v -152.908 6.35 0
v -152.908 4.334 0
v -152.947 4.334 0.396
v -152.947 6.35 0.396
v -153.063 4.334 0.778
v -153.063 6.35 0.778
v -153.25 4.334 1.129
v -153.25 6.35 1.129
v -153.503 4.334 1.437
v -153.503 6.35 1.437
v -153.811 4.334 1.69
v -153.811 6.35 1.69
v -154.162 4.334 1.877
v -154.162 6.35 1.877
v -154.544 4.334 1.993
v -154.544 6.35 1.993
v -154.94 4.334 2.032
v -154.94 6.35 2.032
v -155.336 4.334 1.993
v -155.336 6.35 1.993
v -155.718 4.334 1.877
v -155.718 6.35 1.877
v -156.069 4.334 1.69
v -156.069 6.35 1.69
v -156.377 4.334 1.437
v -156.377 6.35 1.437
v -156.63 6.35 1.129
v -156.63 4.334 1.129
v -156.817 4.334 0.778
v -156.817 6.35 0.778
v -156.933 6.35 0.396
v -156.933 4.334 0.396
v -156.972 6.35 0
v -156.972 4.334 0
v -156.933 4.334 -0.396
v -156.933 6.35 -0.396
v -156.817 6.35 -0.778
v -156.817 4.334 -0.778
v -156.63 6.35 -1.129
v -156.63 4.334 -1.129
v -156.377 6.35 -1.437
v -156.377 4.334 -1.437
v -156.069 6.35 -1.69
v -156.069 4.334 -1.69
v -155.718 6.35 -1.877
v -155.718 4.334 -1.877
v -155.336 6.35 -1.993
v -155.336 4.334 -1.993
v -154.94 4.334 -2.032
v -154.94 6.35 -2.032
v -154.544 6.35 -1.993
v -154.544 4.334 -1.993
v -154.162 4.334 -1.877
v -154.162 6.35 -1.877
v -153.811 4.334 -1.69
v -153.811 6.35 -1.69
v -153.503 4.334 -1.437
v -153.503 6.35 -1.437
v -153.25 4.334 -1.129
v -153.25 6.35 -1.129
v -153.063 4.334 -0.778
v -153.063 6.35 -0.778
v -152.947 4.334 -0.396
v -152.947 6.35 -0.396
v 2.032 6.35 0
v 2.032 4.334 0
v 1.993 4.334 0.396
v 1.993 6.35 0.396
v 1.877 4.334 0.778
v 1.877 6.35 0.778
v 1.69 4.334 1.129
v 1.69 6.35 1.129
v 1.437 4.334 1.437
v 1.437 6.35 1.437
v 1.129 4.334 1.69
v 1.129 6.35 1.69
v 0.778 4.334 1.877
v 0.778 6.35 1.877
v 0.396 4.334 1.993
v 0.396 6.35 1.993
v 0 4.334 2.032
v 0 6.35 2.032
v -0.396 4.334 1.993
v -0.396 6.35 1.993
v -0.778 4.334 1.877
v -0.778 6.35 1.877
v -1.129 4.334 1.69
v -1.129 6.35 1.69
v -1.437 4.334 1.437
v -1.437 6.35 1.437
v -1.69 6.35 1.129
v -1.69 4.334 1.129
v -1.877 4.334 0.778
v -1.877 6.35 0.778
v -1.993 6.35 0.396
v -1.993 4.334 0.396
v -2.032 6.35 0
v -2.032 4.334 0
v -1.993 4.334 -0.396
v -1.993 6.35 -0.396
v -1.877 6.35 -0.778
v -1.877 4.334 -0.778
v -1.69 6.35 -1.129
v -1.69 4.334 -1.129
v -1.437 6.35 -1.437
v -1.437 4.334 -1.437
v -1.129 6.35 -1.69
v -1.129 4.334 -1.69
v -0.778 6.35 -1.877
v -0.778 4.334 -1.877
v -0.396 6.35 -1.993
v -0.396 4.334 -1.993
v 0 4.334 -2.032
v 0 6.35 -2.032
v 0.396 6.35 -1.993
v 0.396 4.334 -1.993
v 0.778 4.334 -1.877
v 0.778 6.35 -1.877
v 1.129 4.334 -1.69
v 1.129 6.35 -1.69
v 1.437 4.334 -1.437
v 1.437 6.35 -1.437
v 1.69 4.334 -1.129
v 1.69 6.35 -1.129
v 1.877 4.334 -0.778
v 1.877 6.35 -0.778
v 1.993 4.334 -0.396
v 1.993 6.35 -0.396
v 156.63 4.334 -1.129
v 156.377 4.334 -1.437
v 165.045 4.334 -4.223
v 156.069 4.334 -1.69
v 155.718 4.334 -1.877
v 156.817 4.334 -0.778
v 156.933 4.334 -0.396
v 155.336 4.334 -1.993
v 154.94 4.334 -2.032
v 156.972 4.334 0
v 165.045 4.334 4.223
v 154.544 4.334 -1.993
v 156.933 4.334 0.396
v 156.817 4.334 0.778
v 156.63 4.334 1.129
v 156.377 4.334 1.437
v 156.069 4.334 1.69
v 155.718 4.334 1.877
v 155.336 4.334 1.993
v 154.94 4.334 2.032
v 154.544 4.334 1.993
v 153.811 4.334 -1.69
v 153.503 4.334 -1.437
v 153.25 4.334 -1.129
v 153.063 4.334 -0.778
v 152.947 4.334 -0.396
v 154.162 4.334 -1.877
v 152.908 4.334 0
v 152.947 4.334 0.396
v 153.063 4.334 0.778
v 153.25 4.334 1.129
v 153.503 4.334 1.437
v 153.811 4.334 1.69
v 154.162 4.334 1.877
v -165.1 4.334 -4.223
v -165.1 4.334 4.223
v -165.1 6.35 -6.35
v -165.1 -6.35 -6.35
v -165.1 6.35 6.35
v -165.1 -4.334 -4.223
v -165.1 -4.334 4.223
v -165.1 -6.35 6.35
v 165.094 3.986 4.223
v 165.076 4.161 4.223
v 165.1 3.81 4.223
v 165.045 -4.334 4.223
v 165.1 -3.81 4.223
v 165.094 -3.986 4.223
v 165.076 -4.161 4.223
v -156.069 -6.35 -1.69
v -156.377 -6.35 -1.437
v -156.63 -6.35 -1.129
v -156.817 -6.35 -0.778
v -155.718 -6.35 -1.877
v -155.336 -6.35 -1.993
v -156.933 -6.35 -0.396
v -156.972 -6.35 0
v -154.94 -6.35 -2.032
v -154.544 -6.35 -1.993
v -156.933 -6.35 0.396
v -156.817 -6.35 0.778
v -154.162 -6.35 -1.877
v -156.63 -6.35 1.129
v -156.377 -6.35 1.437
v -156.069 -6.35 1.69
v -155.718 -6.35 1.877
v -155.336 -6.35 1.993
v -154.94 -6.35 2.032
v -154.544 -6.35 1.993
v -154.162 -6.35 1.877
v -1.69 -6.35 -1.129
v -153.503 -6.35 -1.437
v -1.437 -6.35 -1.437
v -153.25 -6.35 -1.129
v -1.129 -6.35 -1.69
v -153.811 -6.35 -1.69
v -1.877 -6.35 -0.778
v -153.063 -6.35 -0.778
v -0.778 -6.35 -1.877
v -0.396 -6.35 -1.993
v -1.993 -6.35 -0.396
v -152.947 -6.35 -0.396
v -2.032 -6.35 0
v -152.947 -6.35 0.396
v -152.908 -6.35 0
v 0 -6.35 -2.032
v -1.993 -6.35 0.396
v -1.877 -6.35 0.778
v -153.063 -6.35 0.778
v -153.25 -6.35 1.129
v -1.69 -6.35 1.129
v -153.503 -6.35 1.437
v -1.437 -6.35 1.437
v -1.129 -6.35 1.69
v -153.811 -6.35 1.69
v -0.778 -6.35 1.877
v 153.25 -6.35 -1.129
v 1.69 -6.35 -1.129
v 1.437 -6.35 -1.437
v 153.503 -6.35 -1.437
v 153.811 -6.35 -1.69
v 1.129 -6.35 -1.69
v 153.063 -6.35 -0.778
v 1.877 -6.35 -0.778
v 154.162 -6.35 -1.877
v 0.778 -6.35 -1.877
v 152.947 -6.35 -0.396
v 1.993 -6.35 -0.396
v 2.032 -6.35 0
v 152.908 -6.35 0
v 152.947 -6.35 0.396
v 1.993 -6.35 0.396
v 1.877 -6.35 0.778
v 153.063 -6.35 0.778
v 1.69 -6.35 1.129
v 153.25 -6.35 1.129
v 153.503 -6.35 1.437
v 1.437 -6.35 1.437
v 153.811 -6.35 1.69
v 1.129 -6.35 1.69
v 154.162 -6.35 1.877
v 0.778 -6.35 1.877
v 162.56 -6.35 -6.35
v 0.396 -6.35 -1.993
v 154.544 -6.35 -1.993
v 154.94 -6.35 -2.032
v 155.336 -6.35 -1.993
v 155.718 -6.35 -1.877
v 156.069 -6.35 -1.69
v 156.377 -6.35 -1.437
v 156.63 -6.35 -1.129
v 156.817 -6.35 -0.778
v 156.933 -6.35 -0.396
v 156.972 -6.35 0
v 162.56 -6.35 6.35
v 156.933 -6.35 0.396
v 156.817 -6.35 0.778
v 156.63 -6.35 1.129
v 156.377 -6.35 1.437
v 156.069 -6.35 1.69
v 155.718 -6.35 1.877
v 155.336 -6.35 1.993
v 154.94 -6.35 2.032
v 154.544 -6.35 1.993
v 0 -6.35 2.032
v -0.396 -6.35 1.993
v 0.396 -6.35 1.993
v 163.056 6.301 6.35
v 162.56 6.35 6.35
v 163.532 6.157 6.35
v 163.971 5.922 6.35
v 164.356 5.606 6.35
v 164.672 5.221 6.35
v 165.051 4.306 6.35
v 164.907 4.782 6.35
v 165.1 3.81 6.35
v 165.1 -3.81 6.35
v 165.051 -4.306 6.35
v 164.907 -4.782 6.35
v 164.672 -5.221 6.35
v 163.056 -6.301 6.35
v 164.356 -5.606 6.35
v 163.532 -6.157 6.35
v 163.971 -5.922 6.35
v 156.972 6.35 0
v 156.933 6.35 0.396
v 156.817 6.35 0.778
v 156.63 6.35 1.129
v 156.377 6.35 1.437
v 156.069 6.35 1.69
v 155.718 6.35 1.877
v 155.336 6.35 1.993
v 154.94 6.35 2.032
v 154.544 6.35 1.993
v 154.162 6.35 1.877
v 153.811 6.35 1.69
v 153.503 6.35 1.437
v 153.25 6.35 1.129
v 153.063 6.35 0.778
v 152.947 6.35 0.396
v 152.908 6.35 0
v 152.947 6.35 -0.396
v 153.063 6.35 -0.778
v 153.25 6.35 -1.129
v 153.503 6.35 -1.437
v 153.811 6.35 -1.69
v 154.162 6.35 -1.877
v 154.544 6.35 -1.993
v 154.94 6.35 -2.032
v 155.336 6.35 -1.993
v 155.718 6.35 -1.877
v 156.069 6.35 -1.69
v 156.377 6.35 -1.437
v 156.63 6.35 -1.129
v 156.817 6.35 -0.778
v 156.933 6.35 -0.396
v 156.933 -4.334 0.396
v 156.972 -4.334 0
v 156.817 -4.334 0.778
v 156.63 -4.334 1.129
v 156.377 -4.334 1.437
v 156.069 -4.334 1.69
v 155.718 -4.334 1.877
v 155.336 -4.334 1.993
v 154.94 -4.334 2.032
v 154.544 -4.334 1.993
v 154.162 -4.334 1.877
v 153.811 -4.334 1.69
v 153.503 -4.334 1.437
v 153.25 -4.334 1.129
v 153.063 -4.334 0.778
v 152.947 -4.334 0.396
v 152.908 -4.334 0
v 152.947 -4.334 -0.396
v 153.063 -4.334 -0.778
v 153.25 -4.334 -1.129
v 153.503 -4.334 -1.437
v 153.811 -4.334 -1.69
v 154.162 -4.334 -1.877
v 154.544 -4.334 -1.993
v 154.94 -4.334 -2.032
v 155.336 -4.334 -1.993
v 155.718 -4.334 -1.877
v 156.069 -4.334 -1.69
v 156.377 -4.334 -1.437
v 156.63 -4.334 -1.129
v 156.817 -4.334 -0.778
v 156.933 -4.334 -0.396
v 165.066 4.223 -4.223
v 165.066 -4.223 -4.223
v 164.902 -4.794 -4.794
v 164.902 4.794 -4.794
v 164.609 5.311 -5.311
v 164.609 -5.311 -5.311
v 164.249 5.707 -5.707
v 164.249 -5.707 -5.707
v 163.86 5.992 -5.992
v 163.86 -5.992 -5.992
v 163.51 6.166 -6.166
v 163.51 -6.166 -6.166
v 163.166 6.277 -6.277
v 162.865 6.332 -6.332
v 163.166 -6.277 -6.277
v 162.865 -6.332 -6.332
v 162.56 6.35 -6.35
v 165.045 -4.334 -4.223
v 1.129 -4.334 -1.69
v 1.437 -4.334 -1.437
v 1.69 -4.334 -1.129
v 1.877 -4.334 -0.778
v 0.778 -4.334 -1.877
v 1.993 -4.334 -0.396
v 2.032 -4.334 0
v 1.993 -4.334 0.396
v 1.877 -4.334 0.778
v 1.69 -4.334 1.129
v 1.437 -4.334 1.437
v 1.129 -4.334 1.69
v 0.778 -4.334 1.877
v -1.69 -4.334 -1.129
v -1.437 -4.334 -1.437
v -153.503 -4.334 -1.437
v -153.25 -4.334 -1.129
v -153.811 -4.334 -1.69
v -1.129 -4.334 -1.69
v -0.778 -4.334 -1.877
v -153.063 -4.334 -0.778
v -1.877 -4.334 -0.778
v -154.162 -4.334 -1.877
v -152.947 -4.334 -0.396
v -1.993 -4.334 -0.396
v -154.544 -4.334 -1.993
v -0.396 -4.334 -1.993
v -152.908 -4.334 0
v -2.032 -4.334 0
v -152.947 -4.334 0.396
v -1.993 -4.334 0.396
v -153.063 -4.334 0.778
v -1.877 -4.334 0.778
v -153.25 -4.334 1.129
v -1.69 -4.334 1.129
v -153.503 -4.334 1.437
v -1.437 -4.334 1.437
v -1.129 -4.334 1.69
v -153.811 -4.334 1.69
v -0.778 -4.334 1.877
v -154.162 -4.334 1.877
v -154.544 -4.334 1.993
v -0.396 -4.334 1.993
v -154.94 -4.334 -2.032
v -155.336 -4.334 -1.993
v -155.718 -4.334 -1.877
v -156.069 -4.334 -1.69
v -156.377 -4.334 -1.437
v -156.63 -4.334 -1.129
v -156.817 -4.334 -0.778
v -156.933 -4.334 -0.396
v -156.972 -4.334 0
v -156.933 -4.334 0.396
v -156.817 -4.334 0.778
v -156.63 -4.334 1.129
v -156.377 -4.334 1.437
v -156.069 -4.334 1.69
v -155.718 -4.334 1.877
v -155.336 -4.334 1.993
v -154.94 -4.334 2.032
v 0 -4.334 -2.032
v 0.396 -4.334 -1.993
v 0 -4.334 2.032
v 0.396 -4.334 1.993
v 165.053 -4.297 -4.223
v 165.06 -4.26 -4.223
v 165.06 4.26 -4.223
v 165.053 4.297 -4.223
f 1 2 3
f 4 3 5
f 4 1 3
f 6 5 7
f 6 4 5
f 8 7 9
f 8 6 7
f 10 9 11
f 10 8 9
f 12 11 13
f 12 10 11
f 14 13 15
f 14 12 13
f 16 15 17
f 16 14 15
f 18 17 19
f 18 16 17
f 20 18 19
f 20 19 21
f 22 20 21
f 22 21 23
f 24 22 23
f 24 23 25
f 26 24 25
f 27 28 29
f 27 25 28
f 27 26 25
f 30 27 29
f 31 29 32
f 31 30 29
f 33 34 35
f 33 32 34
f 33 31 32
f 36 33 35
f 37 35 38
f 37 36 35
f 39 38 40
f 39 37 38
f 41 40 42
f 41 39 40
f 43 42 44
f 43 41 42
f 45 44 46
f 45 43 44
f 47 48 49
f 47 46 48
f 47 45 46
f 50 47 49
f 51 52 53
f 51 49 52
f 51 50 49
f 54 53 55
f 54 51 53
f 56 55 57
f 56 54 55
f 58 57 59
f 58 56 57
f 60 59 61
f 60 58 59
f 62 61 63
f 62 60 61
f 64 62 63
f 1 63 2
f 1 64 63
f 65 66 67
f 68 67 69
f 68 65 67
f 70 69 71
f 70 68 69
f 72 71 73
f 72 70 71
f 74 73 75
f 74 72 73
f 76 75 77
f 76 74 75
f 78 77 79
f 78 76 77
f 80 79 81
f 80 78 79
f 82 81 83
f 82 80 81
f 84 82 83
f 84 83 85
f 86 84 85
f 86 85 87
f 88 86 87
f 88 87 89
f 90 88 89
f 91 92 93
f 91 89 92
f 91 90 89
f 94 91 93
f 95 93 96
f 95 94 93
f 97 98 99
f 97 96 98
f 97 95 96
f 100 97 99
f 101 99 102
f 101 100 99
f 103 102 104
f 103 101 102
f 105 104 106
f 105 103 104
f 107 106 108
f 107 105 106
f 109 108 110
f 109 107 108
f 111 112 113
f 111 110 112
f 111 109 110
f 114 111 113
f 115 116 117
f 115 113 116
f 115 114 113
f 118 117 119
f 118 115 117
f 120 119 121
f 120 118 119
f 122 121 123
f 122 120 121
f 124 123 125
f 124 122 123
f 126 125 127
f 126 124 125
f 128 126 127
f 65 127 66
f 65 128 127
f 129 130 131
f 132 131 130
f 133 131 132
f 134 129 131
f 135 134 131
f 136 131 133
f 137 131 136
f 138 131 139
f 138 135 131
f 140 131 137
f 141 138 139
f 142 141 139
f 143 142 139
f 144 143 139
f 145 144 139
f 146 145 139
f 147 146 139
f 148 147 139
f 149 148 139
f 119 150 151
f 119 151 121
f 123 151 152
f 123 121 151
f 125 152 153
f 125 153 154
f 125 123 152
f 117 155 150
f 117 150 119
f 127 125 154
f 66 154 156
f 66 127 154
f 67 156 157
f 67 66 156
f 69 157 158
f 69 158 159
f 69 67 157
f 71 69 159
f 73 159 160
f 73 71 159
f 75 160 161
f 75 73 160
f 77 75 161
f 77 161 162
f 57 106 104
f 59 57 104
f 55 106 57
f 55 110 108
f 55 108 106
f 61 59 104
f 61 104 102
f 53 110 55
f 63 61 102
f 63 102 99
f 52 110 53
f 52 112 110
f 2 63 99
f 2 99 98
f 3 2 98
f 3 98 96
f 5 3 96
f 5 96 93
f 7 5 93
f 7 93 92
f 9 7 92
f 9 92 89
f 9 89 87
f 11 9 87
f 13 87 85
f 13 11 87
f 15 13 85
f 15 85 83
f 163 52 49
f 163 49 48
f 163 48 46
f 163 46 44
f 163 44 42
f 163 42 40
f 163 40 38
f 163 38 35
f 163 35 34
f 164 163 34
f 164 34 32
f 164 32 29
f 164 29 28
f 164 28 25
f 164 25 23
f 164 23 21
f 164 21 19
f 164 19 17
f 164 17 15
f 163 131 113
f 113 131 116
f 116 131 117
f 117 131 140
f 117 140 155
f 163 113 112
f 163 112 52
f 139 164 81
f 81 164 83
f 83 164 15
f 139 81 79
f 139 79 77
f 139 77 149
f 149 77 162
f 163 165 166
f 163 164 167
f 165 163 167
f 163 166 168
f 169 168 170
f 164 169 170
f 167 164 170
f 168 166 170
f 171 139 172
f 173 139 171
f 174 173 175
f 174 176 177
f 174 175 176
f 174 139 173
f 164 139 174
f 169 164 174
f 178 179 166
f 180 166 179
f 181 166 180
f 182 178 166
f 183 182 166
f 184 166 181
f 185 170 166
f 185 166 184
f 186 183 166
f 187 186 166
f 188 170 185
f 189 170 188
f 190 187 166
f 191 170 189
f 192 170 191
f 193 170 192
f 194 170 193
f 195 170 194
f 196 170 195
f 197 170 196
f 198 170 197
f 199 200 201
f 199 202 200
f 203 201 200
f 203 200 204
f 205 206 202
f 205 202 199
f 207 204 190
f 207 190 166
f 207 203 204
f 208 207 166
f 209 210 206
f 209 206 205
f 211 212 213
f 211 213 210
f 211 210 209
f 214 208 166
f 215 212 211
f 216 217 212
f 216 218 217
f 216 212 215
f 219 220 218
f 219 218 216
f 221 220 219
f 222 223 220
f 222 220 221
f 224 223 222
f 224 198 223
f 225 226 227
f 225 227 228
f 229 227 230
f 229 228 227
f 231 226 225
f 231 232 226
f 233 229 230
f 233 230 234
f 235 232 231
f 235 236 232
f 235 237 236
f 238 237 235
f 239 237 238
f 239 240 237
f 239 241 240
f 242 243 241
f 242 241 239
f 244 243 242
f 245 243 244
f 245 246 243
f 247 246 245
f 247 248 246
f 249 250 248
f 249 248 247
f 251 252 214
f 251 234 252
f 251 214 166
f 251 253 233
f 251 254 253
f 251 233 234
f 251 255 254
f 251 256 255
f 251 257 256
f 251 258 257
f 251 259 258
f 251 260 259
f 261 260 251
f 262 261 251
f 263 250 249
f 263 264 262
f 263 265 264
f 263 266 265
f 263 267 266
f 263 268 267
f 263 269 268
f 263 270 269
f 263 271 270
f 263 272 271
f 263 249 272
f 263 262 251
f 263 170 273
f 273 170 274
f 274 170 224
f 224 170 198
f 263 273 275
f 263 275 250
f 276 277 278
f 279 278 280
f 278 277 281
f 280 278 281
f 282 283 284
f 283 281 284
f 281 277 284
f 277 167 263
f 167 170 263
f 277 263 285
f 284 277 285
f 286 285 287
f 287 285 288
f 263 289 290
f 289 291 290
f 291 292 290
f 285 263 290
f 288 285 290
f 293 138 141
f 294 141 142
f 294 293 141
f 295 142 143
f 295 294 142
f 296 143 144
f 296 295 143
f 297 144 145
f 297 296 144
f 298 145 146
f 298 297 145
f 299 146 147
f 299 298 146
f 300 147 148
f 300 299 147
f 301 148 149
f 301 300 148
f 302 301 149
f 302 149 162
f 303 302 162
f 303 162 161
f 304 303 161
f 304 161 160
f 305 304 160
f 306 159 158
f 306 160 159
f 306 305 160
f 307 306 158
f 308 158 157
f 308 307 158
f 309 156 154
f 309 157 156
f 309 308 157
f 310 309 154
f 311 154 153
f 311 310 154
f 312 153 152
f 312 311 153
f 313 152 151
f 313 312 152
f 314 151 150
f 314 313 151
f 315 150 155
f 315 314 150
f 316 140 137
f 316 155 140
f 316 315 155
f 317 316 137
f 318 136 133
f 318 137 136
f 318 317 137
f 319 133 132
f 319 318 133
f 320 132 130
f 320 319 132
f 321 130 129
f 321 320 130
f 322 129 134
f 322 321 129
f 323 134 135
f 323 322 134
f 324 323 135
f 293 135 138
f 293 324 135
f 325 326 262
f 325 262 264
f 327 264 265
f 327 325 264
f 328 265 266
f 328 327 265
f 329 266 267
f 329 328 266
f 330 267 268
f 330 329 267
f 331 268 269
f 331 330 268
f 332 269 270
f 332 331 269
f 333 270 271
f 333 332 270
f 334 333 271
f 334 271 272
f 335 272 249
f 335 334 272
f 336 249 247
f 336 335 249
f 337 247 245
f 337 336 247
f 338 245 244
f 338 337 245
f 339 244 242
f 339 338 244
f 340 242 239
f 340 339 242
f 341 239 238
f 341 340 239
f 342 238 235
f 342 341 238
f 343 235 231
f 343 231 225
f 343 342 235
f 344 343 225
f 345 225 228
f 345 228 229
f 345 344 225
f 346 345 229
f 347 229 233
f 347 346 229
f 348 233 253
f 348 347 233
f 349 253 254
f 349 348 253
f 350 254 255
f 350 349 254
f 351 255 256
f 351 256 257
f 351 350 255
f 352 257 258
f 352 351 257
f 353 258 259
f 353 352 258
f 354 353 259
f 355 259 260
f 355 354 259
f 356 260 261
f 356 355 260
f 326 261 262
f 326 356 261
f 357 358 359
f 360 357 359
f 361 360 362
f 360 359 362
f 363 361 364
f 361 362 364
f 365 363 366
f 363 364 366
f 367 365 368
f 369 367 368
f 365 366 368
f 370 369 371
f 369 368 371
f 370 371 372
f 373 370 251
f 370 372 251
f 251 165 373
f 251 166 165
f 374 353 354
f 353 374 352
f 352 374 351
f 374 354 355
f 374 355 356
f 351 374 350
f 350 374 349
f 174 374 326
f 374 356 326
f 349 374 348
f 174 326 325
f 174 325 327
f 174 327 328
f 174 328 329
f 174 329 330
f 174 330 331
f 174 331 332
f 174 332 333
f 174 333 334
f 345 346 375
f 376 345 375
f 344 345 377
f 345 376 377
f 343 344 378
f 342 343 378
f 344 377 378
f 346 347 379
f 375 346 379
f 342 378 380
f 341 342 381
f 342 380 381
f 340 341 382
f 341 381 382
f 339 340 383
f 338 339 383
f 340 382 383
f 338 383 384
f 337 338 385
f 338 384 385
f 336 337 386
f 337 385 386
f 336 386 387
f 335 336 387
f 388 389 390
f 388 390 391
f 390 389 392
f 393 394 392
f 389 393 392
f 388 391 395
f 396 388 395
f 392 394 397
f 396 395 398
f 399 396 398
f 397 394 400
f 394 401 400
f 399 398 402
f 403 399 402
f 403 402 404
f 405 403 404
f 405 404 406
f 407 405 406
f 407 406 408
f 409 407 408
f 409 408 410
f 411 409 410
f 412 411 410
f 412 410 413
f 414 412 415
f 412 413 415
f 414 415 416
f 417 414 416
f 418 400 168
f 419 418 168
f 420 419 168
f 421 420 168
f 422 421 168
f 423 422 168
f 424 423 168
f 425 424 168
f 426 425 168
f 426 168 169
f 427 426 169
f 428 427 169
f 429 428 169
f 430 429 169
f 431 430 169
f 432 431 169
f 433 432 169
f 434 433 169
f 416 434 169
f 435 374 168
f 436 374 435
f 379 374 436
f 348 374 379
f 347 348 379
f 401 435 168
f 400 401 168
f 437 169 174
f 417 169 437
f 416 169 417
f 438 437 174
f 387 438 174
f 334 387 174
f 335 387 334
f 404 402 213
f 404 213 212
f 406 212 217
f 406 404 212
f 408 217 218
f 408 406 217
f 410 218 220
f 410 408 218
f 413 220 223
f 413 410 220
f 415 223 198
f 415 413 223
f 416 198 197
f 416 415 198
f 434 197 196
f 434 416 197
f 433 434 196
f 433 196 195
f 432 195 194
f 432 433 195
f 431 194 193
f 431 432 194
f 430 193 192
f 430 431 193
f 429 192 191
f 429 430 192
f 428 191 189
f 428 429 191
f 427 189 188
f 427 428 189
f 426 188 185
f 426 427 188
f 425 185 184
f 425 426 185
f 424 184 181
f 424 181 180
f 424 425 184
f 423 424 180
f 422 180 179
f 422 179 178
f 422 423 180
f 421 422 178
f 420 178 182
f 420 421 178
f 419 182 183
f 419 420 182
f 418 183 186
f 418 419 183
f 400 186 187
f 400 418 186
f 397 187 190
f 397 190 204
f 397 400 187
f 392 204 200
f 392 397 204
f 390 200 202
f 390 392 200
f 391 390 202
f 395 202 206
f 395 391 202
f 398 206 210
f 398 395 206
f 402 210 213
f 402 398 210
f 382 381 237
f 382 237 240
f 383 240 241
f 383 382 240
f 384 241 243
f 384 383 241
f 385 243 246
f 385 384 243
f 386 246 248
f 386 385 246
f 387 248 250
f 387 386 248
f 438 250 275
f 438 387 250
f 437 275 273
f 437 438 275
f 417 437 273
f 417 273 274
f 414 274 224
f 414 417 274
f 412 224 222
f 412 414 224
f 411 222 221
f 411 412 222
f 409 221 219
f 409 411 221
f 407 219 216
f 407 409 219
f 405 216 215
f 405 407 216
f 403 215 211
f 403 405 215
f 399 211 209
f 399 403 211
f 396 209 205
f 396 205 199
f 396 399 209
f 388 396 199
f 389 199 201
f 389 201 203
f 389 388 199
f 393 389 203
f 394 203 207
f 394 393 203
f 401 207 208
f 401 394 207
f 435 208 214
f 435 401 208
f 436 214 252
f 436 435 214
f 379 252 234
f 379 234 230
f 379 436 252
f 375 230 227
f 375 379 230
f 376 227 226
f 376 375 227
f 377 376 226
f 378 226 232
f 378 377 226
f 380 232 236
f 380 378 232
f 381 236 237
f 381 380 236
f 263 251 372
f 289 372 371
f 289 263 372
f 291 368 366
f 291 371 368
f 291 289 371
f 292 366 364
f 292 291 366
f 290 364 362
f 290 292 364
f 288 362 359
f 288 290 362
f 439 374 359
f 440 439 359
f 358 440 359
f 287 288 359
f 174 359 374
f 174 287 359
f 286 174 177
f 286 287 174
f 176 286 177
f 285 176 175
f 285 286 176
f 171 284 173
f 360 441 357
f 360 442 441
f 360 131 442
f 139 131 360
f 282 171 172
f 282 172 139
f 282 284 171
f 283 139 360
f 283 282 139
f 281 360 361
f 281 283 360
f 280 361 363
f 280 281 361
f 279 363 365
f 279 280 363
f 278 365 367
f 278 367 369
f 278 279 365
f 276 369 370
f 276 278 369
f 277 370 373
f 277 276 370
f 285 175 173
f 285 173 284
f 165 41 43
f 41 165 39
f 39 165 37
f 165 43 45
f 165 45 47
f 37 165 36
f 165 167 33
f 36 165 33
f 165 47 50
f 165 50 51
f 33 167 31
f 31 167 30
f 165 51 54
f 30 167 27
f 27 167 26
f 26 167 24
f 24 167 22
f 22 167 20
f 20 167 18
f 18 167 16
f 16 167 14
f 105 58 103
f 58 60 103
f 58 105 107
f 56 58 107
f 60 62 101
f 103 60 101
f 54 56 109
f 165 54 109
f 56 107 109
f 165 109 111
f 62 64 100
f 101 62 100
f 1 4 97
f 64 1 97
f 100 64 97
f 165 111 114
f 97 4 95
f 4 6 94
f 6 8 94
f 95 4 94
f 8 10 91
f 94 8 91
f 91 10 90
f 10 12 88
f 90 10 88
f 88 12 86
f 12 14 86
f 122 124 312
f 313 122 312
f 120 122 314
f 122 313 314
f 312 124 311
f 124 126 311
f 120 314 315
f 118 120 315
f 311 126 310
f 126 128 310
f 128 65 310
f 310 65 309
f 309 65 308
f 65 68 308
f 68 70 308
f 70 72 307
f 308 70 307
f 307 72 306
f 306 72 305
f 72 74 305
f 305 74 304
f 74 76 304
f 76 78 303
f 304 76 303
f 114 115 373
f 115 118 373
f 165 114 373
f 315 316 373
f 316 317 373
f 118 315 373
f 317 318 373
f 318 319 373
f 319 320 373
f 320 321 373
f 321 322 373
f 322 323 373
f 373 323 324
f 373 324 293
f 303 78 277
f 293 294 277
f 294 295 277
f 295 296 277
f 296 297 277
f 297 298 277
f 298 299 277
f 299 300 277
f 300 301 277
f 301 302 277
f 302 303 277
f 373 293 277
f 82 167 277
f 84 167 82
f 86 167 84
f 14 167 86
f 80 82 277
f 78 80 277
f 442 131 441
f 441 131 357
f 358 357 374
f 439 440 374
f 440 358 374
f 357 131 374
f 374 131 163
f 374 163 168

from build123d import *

# Parameters (mm, degrees)
F0_W     = 330.2
F0_H     = 12.7
F0_R     = 2.032
F1_DEPTH = 6.35
F2_R     = 2.54
F3_W     = 8.6677474901
F3_H     = 8.4455003962
F4_DEPTH = 330.2


with BuildPart() as f1:
    # F0 (on Front) → F1 (new body, symmetric)
    with BuildSketch(Plane.XZ):
        Rectangle(F0_W, F0_H)
        with Locations((-154.94, 0)):
            Circle(F0_R, mode=Mode.SUBTRACT)
        Circle(F0_R, mode=Mode.SUBTRACT)
        with Locations((154.94, 0)):
            Circle(F0_R, mode=Mode.SUBTRACT)
    extrude(amount=F1_DEPTH, both=True)

    # F2
    f2_edges = [f1.edges().sort_by_distance(p)[0] for p in [
        (165.1, 0, -6.35),
        (165.1, 6.35, 0),
        (165.1, -6.35, 0),
    ]]
    fillet(f2_edges, radius=F2_R)

    # F3 (on face) → F4 (cut)
    with BuildSketch(Plane(origin=(-165.1, 0, 0), x_dir=(0, -1, 0), z_dir=(-1, 0, 0))):
        Rectangle(F3_W, F3_H)
    extrude(amount=-F4_DEPTH, mode=Mode.SUBTRACT)


solid = f1.part
